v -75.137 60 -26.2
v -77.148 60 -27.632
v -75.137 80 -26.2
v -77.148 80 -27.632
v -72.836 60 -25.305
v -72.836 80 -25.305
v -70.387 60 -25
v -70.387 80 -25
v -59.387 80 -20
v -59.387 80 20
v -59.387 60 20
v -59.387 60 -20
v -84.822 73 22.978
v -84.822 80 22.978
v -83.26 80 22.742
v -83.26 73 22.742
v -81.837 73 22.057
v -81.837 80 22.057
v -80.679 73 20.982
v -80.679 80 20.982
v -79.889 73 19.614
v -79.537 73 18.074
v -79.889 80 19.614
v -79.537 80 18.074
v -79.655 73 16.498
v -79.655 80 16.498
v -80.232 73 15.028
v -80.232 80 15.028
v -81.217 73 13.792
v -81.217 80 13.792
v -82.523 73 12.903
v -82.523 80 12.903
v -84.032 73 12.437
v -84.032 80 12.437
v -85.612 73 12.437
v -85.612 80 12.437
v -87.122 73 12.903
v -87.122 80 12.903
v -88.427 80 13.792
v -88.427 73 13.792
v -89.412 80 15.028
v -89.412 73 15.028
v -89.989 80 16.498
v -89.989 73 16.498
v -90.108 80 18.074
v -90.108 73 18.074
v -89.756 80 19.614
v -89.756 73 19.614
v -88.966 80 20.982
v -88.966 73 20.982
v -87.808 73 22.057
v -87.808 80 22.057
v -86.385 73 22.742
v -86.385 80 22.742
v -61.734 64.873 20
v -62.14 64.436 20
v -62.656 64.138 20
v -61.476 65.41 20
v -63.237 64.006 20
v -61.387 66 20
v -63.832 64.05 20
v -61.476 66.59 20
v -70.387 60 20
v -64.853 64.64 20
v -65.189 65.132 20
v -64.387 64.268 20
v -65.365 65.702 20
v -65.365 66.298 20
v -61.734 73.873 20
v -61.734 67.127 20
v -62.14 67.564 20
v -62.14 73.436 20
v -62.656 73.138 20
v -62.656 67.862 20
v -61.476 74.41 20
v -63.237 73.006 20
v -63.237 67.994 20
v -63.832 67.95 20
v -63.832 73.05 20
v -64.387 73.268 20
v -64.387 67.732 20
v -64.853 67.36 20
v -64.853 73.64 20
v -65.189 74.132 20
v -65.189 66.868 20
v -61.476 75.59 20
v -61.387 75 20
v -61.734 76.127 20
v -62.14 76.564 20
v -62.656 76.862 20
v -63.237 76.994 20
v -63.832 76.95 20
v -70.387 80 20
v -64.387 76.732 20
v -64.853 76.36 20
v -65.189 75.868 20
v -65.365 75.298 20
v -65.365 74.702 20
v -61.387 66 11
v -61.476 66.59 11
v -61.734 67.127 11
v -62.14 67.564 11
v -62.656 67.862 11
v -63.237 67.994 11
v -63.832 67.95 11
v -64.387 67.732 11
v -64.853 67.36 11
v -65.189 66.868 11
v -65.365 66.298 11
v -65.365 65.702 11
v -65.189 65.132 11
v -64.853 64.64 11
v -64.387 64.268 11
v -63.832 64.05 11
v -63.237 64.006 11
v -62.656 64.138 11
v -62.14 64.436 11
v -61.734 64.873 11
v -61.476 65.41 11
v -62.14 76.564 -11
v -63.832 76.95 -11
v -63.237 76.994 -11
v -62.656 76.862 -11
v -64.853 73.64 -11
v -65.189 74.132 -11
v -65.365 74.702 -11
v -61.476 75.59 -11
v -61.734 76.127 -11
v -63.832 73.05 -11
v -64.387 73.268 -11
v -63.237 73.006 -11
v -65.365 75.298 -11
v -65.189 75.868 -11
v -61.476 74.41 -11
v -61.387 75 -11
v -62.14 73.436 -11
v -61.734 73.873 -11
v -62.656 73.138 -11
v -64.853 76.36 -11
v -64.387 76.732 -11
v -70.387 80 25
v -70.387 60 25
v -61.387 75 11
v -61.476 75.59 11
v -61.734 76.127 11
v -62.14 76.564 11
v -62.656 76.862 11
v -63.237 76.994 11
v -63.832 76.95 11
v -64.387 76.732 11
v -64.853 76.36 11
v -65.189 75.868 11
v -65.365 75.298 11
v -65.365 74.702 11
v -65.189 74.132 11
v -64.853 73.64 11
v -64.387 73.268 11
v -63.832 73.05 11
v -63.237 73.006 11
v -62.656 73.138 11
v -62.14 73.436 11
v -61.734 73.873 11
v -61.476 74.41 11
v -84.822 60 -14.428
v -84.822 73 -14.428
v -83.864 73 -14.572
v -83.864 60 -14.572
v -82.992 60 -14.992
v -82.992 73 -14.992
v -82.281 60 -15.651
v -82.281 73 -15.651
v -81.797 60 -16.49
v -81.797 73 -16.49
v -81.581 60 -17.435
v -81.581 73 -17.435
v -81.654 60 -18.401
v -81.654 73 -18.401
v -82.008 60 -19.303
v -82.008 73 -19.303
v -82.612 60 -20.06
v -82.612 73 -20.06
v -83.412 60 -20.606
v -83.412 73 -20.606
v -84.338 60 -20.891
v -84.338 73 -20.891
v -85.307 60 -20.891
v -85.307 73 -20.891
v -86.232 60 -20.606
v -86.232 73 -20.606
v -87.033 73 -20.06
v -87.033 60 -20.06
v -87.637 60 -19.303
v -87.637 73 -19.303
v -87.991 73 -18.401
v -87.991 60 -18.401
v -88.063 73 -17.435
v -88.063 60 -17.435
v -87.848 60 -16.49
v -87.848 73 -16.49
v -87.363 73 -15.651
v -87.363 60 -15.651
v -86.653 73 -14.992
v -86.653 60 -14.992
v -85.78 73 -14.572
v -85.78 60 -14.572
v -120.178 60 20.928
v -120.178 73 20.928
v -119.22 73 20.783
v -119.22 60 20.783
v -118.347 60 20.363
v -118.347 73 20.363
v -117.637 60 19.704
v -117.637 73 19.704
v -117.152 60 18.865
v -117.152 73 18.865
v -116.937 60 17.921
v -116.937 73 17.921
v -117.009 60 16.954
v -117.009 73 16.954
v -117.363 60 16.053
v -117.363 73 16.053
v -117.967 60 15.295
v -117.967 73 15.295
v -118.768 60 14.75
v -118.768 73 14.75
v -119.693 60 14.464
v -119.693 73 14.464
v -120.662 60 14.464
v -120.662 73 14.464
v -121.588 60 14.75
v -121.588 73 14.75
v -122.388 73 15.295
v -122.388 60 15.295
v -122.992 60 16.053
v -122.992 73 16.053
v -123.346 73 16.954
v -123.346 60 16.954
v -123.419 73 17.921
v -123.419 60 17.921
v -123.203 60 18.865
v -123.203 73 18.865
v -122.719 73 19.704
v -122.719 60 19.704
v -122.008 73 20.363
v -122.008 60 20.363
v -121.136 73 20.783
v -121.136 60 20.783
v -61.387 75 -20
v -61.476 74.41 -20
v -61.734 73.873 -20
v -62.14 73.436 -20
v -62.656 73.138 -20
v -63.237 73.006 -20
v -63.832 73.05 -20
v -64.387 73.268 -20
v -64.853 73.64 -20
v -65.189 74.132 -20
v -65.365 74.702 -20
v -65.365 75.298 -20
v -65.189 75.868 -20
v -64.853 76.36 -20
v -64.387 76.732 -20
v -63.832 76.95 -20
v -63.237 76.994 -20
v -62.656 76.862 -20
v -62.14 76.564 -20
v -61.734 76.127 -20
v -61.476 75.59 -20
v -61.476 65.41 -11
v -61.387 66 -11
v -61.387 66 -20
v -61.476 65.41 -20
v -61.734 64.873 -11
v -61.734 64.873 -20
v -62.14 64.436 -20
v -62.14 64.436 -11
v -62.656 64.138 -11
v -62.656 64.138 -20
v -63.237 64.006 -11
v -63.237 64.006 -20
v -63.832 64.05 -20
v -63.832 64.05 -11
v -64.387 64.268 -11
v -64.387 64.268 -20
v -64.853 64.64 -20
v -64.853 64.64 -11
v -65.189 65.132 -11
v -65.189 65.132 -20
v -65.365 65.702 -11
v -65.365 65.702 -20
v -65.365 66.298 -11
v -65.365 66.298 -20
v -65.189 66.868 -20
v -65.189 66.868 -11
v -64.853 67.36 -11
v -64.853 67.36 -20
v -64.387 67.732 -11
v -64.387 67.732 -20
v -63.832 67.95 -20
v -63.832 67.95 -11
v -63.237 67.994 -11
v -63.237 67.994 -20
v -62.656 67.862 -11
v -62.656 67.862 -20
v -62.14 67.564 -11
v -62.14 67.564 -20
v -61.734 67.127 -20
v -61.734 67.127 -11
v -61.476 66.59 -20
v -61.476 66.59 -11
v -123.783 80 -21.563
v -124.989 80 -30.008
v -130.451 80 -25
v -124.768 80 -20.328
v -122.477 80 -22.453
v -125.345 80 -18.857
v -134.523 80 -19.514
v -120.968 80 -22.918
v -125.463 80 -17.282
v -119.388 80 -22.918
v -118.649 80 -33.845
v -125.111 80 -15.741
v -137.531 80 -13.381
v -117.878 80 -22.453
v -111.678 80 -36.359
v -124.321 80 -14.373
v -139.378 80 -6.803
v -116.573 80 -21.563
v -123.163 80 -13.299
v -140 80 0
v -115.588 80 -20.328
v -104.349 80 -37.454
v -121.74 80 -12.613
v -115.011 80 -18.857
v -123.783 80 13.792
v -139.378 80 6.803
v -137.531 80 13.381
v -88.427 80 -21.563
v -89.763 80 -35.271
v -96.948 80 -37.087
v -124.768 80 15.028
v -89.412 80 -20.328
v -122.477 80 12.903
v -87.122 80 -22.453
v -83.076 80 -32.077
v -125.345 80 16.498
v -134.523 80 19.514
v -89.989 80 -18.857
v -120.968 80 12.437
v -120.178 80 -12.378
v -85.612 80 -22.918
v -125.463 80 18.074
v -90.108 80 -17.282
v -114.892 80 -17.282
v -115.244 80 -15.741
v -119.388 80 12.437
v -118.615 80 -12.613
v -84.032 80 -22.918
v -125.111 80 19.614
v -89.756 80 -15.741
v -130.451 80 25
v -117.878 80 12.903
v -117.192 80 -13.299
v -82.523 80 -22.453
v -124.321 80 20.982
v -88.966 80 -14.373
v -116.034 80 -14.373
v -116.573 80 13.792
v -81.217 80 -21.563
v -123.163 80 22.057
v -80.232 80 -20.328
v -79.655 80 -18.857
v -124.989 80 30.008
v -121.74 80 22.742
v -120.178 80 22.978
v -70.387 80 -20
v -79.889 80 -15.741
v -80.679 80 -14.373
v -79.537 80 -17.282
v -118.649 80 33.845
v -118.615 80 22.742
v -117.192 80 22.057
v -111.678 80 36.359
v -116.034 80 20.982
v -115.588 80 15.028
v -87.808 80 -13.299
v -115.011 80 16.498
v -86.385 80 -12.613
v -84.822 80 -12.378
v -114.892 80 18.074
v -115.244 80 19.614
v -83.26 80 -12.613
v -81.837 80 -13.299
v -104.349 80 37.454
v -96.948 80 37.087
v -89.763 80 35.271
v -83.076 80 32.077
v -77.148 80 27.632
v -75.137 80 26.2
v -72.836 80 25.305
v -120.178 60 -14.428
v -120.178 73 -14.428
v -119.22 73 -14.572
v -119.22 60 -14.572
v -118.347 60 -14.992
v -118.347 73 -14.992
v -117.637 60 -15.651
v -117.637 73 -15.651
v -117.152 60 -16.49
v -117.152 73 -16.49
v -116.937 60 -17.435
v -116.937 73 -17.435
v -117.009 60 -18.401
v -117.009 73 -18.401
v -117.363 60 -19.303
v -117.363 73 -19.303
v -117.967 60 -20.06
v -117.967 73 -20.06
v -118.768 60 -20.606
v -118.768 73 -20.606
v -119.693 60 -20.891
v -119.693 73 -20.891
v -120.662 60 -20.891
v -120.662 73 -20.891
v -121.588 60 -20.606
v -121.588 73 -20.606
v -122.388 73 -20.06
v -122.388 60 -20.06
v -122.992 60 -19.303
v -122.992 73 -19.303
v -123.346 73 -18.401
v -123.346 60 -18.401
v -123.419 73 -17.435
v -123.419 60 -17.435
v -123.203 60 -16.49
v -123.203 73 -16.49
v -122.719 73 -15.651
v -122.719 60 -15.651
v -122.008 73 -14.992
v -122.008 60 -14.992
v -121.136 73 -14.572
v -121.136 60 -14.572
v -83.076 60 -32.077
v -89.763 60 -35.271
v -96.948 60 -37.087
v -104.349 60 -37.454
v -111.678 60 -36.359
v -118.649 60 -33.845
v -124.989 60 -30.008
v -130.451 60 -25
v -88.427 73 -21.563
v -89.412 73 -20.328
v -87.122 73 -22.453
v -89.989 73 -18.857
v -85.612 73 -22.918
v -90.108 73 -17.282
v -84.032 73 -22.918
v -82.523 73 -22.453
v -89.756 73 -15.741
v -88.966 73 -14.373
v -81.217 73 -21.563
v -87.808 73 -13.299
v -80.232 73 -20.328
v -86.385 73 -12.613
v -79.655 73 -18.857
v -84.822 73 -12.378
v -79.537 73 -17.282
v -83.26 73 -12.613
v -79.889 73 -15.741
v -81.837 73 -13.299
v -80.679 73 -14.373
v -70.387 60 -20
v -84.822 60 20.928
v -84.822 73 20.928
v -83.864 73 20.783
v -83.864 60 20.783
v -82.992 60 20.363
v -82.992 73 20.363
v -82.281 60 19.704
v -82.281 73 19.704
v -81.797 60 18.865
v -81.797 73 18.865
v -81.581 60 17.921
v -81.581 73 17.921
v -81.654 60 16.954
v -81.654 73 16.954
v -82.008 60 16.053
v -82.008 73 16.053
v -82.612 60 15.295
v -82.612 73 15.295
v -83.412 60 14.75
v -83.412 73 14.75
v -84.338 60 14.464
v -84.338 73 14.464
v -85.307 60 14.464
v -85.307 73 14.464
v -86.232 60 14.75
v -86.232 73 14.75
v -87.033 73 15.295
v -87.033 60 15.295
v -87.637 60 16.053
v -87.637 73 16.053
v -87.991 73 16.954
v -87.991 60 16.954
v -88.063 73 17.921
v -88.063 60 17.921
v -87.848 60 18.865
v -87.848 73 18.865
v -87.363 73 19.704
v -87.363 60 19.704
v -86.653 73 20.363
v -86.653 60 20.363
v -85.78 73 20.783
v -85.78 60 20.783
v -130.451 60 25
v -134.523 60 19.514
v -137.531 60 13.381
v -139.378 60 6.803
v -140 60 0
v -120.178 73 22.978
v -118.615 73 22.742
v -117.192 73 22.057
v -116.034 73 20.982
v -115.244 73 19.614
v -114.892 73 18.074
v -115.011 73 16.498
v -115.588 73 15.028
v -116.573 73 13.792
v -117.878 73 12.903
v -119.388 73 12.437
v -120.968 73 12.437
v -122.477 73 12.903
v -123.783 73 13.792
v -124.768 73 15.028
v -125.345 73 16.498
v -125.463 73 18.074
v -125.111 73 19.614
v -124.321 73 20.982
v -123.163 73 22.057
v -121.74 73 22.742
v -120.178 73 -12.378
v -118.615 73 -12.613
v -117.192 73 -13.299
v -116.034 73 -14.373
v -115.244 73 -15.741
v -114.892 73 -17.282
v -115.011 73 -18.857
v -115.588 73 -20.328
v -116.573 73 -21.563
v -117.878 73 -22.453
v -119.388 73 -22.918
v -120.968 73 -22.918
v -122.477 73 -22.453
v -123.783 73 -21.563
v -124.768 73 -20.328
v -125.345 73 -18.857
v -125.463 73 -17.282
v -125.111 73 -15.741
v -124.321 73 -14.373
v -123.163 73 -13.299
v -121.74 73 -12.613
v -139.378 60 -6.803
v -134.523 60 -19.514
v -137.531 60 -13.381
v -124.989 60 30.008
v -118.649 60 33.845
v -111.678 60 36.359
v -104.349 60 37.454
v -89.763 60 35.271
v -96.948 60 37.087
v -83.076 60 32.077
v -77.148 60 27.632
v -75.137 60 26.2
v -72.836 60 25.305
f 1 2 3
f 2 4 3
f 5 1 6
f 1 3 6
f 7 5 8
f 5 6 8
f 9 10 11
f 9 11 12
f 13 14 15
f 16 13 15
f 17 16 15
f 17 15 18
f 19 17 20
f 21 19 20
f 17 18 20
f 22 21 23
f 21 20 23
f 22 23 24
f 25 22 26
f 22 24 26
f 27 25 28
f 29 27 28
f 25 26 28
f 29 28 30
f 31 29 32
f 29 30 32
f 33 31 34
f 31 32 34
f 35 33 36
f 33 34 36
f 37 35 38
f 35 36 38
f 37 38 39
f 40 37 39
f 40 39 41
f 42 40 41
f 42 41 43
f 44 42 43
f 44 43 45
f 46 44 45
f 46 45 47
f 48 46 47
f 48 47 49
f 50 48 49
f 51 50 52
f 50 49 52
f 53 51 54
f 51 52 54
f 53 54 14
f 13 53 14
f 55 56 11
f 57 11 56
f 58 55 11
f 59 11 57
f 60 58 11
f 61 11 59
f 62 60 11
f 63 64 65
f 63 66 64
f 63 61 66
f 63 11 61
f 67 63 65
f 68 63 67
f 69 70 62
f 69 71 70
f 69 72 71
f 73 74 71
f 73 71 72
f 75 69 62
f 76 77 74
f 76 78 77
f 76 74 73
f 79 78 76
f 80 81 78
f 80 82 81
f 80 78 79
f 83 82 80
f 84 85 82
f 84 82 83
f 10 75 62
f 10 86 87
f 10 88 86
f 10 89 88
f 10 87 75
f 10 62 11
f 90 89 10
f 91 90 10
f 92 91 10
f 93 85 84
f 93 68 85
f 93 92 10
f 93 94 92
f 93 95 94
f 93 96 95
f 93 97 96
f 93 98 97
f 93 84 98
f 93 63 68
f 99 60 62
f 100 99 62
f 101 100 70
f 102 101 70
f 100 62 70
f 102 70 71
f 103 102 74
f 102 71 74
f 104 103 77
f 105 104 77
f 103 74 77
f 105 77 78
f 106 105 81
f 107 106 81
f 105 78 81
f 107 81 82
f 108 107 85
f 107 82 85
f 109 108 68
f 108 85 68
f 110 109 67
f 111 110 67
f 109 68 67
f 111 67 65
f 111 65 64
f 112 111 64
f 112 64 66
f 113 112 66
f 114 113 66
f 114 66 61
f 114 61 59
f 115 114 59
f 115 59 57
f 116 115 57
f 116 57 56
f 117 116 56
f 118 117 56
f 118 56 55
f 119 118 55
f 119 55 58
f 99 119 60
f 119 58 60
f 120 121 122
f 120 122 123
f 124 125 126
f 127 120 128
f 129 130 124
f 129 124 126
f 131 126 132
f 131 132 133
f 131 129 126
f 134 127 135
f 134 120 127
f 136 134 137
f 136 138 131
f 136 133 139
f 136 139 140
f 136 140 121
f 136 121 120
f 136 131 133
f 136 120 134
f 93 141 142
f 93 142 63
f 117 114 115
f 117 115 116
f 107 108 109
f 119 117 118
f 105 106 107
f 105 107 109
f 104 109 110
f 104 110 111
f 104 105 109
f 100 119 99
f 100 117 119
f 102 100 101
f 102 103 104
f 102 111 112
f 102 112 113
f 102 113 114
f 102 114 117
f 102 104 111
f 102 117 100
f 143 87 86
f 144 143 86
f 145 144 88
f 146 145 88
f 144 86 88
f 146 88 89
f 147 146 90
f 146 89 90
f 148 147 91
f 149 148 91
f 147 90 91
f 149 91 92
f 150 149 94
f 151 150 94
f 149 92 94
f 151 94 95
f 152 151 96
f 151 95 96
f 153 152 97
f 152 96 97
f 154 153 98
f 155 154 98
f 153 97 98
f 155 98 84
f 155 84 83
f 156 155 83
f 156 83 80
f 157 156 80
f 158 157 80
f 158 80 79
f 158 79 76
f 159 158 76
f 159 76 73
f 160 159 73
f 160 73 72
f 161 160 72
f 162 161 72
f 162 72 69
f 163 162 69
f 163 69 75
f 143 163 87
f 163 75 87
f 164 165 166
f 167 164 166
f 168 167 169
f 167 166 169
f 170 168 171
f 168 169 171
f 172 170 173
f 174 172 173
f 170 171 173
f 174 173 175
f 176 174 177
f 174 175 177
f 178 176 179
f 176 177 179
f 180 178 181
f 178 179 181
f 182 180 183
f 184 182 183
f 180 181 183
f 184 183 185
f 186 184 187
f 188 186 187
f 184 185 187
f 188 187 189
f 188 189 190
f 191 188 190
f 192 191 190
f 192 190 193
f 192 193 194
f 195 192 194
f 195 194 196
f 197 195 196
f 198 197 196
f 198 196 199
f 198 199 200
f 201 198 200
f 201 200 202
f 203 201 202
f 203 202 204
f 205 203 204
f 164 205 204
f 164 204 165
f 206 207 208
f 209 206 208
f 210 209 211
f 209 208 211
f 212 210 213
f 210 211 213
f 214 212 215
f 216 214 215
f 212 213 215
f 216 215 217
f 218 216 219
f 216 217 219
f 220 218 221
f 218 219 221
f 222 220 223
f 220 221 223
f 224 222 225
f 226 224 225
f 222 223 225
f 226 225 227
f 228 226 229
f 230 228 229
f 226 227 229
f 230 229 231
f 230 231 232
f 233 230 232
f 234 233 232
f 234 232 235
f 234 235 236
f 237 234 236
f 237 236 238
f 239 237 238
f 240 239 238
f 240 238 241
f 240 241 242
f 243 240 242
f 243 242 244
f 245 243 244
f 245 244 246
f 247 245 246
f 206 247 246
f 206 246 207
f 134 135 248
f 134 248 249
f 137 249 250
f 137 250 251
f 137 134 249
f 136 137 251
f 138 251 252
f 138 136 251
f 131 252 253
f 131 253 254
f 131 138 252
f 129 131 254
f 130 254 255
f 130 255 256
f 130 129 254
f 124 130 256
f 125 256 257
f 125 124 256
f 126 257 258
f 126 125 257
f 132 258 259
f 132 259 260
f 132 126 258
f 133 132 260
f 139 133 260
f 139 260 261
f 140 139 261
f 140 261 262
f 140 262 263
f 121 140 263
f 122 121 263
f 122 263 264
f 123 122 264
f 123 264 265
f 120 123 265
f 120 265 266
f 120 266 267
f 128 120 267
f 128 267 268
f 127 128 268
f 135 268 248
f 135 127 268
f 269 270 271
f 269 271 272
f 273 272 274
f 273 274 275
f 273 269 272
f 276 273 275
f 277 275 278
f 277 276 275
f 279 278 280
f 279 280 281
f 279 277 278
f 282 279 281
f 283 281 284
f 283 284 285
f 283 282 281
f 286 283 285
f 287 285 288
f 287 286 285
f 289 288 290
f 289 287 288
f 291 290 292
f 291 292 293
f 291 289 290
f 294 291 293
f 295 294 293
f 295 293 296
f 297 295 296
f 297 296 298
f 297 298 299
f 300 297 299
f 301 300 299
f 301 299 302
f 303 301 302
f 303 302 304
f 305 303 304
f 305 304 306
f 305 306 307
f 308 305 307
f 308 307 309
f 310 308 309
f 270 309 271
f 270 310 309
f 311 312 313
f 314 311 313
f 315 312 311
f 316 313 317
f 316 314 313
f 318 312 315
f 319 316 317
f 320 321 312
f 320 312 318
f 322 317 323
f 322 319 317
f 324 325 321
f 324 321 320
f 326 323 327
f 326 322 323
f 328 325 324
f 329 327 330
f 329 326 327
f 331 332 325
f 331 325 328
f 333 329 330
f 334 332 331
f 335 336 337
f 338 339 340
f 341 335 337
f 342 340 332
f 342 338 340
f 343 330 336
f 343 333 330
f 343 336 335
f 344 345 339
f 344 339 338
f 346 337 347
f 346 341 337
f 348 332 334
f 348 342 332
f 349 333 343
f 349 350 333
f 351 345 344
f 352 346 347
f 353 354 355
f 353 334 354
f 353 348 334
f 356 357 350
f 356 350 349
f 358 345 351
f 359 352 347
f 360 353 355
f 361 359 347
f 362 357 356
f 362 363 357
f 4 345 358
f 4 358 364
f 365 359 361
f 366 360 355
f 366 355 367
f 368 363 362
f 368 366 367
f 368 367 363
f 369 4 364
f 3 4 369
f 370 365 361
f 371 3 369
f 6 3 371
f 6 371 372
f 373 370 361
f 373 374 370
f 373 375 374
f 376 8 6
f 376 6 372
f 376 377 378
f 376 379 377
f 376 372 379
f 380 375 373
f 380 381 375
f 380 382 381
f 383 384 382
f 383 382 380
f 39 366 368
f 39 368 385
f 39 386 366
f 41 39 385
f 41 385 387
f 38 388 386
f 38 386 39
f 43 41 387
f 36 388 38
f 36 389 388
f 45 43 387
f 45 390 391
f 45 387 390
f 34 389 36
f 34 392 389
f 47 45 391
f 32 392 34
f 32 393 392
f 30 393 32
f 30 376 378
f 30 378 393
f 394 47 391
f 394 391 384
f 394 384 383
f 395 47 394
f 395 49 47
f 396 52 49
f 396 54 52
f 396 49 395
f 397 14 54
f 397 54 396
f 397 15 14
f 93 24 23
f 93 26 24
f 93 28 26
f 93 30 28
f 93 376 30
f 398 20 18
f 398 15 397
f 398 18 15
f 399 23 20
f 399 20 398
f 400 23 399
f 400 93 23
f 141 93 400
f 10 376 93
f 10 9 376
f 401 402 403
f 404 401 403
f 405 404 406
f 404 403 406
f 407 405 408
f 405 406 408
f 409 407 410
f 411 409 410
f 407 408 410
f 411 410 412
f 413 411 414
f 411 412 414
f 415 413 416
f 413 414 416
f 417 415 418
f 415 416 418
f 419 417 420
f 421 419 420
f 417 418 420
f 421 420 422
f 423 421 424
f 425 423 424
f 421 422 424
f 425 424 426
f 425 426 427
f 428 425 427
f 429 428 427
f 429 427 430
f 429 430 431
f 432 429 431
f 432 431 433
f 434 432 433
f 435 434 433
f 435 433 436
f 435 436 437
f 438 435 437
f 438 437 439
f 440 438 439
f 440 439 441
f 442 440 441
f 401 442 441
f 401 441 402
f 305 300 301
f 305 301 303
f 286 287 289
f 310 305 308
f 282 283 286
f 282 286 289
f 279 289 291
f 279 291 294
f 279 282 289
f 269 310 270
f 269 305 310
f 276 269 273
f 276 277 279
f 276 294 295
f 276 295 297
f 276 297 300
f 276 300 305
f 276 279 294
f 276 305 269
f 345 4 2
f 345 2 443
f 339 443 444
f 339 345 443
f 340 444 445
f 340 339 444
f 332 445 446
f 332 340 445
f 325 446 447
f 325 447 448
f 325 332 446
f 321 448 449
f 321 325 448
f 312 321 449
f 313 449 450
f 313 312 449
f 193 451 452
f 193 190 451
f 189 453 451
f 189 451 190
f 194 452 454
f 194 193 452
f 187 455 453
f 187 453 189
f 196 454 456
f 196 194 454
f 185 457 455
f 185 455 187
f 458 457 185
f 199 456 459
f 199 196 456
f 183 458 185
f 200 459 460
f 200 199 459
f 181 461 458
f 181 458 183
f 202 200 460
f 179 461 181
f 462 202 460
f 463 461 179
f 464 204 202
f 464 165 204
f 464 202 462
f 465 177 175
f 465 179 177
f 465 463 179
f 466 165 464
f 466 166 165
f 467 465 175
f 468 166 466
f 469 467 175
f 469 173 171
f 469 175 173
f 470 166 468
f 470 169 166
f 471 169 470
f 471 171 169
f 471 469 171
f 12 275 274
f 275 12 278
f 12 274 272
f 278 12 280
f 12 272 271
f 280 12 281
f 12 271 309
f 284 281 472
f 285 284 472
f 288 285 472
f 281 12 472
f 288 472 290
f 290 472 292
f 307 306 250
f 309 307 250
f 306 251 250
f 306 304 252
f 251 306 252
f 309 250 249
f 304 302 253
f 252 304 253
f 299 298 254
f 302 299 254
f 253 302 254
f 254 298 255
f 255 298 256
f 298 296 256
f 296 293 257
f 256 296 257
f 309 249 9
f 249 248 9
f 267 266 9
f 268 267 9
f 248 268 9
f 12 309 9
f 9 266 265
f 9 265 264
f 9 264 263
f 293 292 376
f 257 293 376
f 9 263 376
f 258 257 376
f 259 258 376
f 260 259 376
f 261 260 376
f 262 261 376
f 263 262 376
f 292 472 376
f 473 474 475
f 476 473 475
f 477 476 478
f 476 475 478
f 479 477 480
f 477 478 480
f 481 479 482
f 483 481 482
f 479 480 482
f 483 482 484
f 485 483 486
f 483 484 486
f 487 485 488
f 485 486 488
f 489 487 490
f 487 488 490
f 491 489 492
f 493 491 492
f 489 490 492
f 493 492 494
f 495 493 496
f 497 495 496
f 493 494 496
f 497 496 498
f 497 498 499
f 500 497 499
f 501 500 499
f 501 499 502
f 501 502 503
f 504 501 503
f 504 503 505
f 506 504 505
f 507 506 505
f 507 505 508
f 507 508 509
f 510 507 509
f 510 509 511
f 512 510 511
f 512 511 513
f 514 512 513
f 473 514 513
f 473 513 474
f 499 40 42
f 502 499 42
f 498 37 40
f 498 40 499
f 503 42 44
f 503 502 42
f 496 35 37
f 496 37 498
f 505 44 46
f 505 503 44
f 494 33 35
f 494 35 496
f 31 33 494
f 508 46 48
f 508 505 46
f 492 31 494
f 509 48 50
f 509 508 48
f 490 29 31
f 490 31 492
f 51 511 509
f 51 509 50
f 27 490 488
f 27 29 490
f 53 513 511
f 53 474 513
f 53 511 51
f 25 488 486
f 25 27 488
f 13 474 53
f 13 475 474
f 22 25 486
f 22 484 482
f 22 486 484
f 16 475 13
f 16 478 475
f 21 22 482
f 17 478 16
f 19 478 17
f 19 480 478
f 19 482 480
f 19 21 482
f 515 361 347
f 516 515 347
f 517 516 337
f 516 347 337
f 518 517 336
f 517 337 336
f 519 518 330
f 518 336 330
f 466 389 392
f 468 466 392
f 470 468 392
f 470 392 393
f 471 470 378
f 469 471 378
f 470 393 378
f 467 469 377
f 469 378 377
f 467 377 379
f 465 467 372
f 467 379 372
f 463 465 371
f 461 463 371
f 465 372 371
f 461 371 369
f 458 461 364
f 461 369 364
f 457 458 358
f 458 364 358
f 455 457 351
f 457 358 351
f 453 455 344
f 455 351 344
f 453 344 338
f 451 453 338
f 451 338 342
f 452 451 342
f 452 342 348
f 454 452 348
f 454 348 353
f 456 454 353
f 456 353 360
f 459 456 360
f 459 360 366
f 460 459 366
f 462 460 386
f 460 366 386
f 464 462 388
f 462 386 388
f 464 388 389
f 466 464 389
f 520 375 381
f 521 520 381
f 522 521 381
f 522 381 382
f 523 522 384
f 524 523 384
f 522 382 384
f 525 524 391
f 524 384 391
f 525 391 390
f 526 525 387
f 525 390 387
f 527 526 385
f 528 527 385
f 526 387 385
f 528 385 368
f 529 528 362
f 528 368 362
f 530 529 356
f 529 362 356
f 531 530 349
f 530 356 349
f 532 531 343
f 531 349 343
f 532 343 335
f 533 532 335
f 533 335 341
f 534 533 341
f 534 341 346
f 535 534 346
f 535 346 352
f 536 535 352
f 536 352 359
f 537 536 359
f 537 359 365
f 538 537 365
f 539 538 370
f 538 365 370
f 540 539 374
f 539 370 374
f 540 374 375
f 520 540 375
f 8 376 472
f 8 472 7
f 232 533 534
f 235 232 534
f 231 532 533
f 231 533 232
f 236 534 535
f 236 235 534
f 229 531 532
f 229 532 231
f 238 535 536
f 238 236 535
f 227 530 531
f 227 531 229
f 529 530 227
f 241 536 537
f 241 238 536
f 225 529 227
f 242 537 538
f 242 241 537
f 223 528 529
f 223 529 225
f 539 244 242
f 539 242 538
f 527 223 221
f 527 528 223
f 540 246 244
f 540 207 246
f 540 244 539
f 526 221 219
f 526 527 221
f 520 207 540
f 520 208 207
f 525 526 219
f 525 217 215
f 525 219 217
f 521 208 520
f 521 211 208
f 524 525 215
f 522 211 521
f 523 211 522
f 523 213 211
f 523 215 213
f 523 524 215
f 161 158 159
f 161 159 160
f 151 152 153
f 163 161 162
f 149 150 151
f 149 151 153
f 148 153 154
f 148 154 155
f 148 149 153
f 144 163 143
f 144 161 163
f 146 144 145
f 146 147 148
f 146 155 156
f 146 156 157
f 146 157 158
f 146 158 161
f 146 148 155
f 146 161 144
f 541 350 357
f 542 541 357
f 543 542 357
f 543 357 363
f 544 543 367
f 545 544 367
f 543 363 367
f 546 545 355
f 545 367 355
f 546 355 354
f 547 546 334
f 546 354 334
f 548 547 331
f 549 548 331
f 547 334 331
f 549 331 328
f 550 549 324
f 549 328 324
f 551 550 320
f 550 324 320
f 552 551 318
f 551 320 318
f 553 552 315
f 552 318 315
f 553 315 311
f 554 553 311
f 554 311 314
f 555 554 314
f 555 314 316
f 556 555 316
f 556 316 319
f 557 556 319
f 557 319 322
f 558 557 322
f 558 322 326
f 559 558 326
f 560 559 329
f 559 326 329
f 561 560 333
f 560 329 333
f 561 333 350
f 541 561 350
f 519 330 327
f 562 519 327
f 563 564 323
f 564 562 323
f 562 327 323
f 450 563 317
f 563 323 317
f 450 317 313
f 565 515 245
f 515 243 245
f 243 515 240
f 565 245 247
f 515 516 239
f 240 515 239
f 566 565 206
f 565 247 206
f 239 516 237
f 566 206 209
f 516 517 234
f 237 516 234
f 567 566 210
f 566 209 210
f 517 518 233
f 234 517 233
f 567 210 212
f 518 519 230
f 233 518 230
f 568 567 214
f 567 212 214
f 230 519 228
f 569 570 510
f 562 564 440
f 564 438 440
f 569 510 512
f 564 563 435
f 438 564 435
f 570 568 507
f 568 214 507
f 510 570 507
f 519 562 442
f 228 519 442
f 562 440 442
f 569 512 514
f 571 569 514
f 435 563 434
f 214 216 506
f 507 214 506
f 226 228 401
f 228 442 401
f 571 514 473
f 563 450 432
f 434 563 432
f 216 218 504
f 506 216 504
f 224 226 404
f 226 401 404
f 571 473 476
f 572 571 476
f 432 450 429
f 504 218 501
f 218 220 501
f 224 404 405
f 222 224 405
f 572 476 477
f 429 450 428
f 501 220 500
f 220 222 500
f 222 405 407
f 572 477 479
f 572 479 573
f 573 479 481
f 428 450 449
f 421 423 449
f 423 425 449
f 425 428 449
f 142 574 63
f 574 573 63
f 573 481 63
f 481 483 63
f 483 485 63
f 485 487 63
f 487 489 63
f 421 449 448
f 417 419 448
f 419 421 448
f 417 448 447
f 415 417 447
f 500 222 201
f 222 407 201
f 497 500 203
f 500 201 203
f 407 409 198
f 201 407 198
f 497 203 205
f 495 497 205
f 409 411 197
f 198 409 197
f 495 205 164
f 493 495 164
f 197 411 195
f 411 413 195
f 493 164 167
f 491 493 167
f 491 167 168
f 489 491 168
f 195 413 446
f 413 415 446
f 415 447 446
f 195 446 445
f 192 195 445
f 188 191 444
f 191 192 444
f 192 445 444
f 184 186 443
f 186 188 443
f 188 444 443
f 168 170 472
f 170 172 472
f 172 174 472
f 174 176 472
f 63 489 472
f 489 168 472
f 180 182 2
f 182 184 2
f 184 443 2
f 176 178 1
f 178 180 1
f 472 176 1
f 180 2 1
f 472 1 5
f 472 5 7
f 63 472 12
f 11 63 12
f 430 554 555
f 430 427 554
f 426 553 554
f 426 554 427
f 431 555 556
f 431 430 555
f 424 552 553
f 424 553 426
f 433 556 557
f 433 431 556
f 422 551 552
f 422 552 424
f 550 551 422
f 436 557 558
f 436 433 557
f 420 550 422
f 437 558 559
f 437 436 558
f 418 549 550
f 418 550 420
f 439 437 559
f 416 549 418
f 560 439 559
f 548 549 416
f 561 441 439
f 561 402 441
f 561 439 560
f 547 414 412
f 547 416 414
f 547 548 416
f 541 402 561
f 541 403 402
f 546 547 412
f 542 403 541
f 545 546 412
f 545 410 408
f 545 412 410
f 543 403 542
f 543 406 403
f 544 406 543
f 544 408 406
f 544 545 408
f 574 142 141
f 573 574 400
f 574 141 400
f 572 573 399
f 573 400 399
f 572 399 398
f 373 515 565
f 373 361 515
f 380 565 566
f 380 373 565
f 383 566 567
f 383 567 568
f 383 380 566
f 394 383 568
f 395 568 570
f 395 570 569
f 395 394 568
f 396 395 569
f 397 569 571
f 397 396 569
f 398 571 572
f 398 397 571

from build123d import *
from build123d.topology import SkipClean

# Parameters (mm, degrees)
SKETCH1_W                = 50
SKETCH1_H                = 50
SKETCH1_RX               = 19.7
SKETCH1_RY               = 19.1
BOSS_EXTRUDE1_DEPTH      = 35
SKETCH2_W                = 30
SKETCH2_H                = 50
CUT_EXTRUDE1_DEPTH       = 35
SKETCH3_W                = 13
SKETCH3_H                = 50
BOSS_EXTRUDE2_DEPTH      = 20
SKETCH4_R                = 1.5
CUT_EXTRUDE2_DEPTH       = 64.639610377
SKETCH5_W                = 36.974567712
SKETCH5_H                = 20
CUT_EXTRUDE3_DEPTH       = 20
BOSS_EXTRUDE3_DEPTH      = 4
BOSS_EXTRUDE3_DEPTH_BACK = 20
SKETCH6_W                = 14
SKETCH6_H                = 20
SKETCH6_R                = 3.25
SKETCH7_R                = 5.3
SKETCH7_R_2              = 3
CUT_EXTRUDE4_DEPTH       = 6
SKETCH8_W                = 13
SKETCH8_H                = 13.025432288
CUT_EXTRUDE5_DEPTH       = 30
FILLET6_R                = 4
FILLET5_R                = 10
SKETCH9_R                = 5.3
BOSS_EXTRUDE4_DEPTH      = 30
SKETCH10_W               = 20
SKETCH10_H               = 50
BOSS_EXTRUDE5_DEPTH      = 45
FILLET7_R                = 10
SKETCH11_W               = 50
SKETCH11_H               = 20
BOSS_EXTRUDE6_DEPTH      = 85
FILLET8_R                = 9.5
SKETCH13_R               = 37.5
BOSS_EXTRUDE7_DEPTH      = 20
CUT_EXTRUDE6_DEPTH       = 85
FILLET9_R                = 10
FILLET10_R               = 10
SKETCH14_R               = 3.25
CUT_EXTRUDE7_DEPTH       = 85
SKETCH15_R               = 5.3
CUT_EXTRUDE8_DEPTH       = 7
SKETCH16_R               = 3.25
BOSS_EXTRUDE9_DEPTH      = 36
SKETCH16_3_R             = 3.25
CUT_EXTRUDE11_DEPTH      = 10
SKETCH18_W               = 78
SKETCH18_H               = 80
CUT_EXTRUDE13_DEPTH      = 69.386919
SKETCH19_W               = 40
SKETCH19_H               = 20
BOSS_EXTRUDE10_DEPTH     = 11
SKETCH20_R               = 2
CUT_EXTRUDE14_DEPTH      = 9
CUT_EXTRUDE15_START      = -9
SKETCH21_R               = 2
CUT_EXTRUDE15_DEPTH      = 9


# Some blends are built 0.0001 mm under size
with BuildPart() as part:
    # Sketch1 → Boss-Extrude1 (new body)
    with BuildSketch(Plane(origin=(0, 0, 0), x_dir=(1, 0, 0), z_dir=(0, 1, 0))):
        Rectangle(SKETCH1_W, SKETCH1_H)
        with Locations((0, 0)):
            Ellipse(SKETCH1_RX, SKETCH1_RY, mode=Mode.SUBTRACT)
    extrude(amount=BOSS_EXTRUDE1_DEPTH)

    # Sketch2 → Cut-Extrude1 (cut)
    with BuildSketch(Plane(origin=(0, 35, 0), x_dir=(1, 0, 0), z_dir=(0, 1, 0))):
        with Locations((10, 0)):
            Rectangle(SKETCH2_W, SKETCH2_H)
    extrude(amount=-CUT_EXTRUDE1_DEPTH, mode=Mode.SUBTRACT)

    # Sketch3 → Boss-Extrude2 (add)
    with BuildSketch(Plane(origin=(0, 35, 0), x_dir=(1, 0, 0), z_dir=(0, 1, 0))):
        with Locations((-18.5, 0)):
            Rectangle(SKETCH3_W, SKETCH3_H)
    extrude(amount=BOSS_EXTRUDE2_DEPTH)

    # Sketch4 → Cut-Extrude2 (cut, through all)
    with BuildSketch(Plane.ZY.offset(25)):
        with Locations((18.474567712, 50)):
            Circle(SKETCH4_R)
    extrude(amount=-CUT_EXTRUDE2_DEPTH, mode=Mode.SUBTRACT)

    # Sketch5 → Cut-Extrude3 (cut)
    with BuildSketch(Plane(origin=(-12, 55, -25), x_dir=(0, 0, 1), z_dir=(-1, 0, 0))):
        with Locations((18.487283856, -10)):
            Rectangle(SKETCH5_W, SKETCH5_H)
    extrude(amount=CUT_EXTRUDE3_DEPTH, mode=Mode.SUBTRACT)

    # Sketch6 → Boss-Extrude3 (add, two sides: drawn at the far end of the back side and taken through both)
    # profile 1 of 2: a face of its own
    with BuildSketch(Plane(origin=(-5, 0, 0), x_dir=(0, 0, -1), z_dir=(1, 0, 0)).offset(-BOSS_EXTRUDE3_DEPTH_BACK)):
        with Locations((-32, 17.5)):
            Rectangle(SKETCH6_W, SKETCH6_H)
        with Locations((-32, 17.5)):
            Circle(SKETCH6_R, mode=Mode.SUBTRACT)
    # profile 2 of 2: a face of its own
    with BuildSketch(Plane(origin=(-5, 0, 0), x_dir=(0, 0, -1), z_dir=(1, 0, 0)).offset(-BOSS_EXTRUDE3_DEPTH_BACK)):
        with Locations((32, 17.5)):
            Rectangle(SKETCH6_W, SKETCH6_H)
        with Locations((32, 17.5)):
            Circle(SKETCH6_R, mode=Mode.SUBTRACT)
    extrude(amount=BOSS_EXTRUDE3_DEPTH + BOSS_EXTRUDE3_DEPTH_BACK)

    # Sketch7 → Cut-Extrude4 (cut)
    with BuildSketch(Plane.ZY.offset(25)):
        with Locations((-32, 17.5)):
            Circle(SKETCH7_R)
        with Locations((32, 17.5)):
            Circle(SKETCH7_R)
        with Locations((18.474567712, 50)):
            Circle(SKETCH7_R_2)
    extrude(amount=-CUT_EXTRUDE4_DEPTH, mode=Mode.SUBTRACT)

    # Sketch8 → Cut-Extrude5 (cut)
    with BuildSketch(Plane(origin=(0, 35, 0), x_dir=(1, 0, 0), z_dir=(0, 1, 0))):
        with Locations((-18.5, -18.487283856)):
            Rectangle(SKETCH8_W, SKETCH8_H)
    extrude(amount=CUT_EXTRUDE5_DEPTH, mode=Mode.SUBTRACT)

    # Fillet6
    fillet6_edges = [part.edges().sort_by_distance(p)[0] for p in [
        (-5, 17.5, 25),
        (-5, 17.5, -25),
    ]]
    fillet(fillet6_edges, radius=FILLET6_R - 0.0001)  # a hair under: the kernel refuses the full size

    # Fillet5
    # the kernel refuses this fillet: 10 mm, written as the material it adds along each edge
    with BuildSketch(Plane(origin=(-5, 7.5, 25), x_dir=(0, -1, 0), z_dir=(-1, 0, 0))) as fillet5_piece_1:
        with BuildLine():
            CenterArc((10, 9.682458366), FILLET5_R, 180, 75.522487814)
            Line((0, 9.682458366), (0, 0))
            Line((0, 0), (7.5, 0))
        make_face()
    extrude(amount=20)
    with BuildSketch(Plane(origin=(-5, 27.5, 25), x_dir=(0, 0, 1), z_dir=(-1, 0, 0)), Plane(origin=(-5, 7.5, -25), x_dir=(0, 0, -1), z_dir=(-1, 0, 0))) as fillet5_piece_2:
        with BuildLine():
            CenterArc((9.682458366, 10), FILLET5_R, 194.477512186, 75.522487814)
            Line((0, 7.5), (0, 0))
            Line((0, 0), (9.682458366, 0))
        make_face()
    extrude(amount=20)
    with BuildSketch(Plane(origin=(-5, 27.5, -25), x_dir=(0, 0, -1), z_dir=(-1, 0, 0))) as fillet5_piece_3:
        with BuildLine():
            CenterArc((9.682458366, -10), FILLET5_R, 90, 75.522487814)
            Line((0, -7.5), (0, 0))
            Line((0, 0), (9.682458366, 0))
        make_face()
    extrude(amount=20)

    # Sketch9 → Boss-Extrude4 (add)
    with BuildSketch(Plane.ZY.offset(25)):
        with BuildLine():
            Line((39, 27.5), (34.682458366, 27.5))
            ThreePointArc((34.682458366, 27.5), (28.558734009, 29.59430585), (25, 35))
            Line((25, 35), (-25, 35))
            ThreePointArc((-25, 35), (-28.558734009, 29.59430585), (-34.682458366, 27.5))
            Line((-34.682458366, 27.5), (-39, 27.5))
            Line((-39, 27.5), (-39, 7.5))
            Line((-39, 7.5), (-34.682458366, 7.5))
            ThreePointArc((-34.682458366, 7.5), (-28.558734009, 5.40569415), (-25, 0))
            Line((-25, 0), (25, 0))
            ThreePointArc((25, 0), (28.558734009, 5.40569415), (34.682458366, 7.5))
            Line((34.682458366, 7.5), (39, 7.5))
            Line((39, 7.5), (39, 27.5))
        make_face()
        with Locations((32, 17.5)):
            Circle(SKETCH9_R, mode=Mode.SUBTRACT)
        with Locations((-32, 17.5)):
            Circle(SKETCH9_R, mode=Mode.SUBTRACT)
    extrude(amount=BOSS_EXTRUDE4_DEPTH)

    # Sketch10 → Boss-Extrude5 (add)
    with SkipClean():  # the faces are left unmerged after this step: merging them gives an invalid solid
        with BuildSketch(Plane(origin=(0, 35, 0), x_dir=(1, 0, 0), z_dir=(0, 1, 0))):
            with Locations((-45, 0)):
                Rectangle(SKETCH10_W, SKETCH10_H)
        extrude(amount=BOSS_EXTRUDE5_DEPTH)

    # Fillet7
    fillet7_edges = [part.edges().sort_by_distance(p)[0] for p in [
        (-35, 35, 0),
    ]]
    fillet(fillet7_edges, radius=FILLET7_R - 0.0001)  # a hair under: the kernel refuses the full size

    # Sketch11 → Boss-Extrude6 (add)
    with BuildSketch(Plane.ZY.offset(55)):
        with Locations((0, 70)):
            Rectangle(SKETCH11_W, SKETCH11_H)
    extrude(amount=BOSS_EXTRUDE6_DEPTH)

    # Fillet8
    fillet8_edges = [part.edges().sort_by_distance(p)[0] for p in [
        (-55, 60, 0),
    ]]
    fillet(fillet8_edges, radius=FILLET8_R)

    # Sketch13 → Boss-Extrude7 (add)
    with BuildSketch(Plane(origin=(0, 80, 0), x_dir=(1, 0, 0), z_dir=(0, 1, 0))):
        with Locations((-102.5, 0)):
            Circle(SKETCH13_R)
    extrude(amount=-BOSS_EXTRUDE7_DEPTH)

    # Sketch13<3> → Cut-Extrude6 (cut)
    with BuildSketch(Plane(origin=(0, 80, 0), x_dir=(1, 0, 0), z_dir=(0, 1, 0))):
        with BuildLine():
            Line((-124.371968295, 30.460909424), (-140, 25))
            Line((-140, 25), (-140, 0))
            ThreePointArc((-140, 0), (-135.865017691, 17.117990375), (-124.371968295, 30.460909424))
        make_face()
        with BuildLine():
            ThreePointArc((-130.450849719, -25), (-137.531463461, -13.380828366), (-140, 0))
            Line((-140, 0), (-140, -25))
            Line((-140, -25), (-130.450849719, -25))
        make_face()
    extrude(amount=-CUT_EXTRUDE6_DEPTH, mode=Mode.SUBTRACT)

    # Fillet9
    fillet9_edges = [part.edges().sort_by_distance(p)[0] for p in [
        (-74.549150281, 70, 25),
        (-74.549150281, 70, -25),
    ]]
    fillet(fillet9_edges, radius=FILLET9_R)

    # Fillet10
    fillet10_edges = [part.edges().sort_by_distance(p)[0] for p in [
        (-35, 80, 0),
    ]]
    fillet(fillet10_edges, radius=FILLET10_R)

    # Sketch14 → Cut-Extrude7 (cut)
    with BuildSketch(Plane(origin=(0, 80, 0), x_dir=(1, 0, 0), z_dir=(0, 1, 0))):
        with Locations(Location((-120.17766953, 17.67766953, 0), (0, 0, 270))):
            Circle(SKETCH14_R)
        with Locations(Location((-120.17766953, -17.67766953, 0), (0, 0, 270))):
            Circle(SKETCH14_R)
        with Locations(Location((-84.82233047, -17.67766953, 0), (0, 0, 270))):
            Circle(SKETCH14_R)
        with Locations(Location((-84.82233047, 17.67766953, 0), (0, 0, 270))):
            Circle(SKETCH14_R)
    extrude(amount=-CUT_EXTRUDE7_DEPTH, mode=Mode.SUBTRACT)

    # Sketch15 → Cut-Extrude8 (cut)
    with BuildSketch(Plane(origin=(0, 80, 0), x_dir=(1, 0, 0), z_dir=(0, 1, 0))):
        with Locations(Location((-120.17766953, 17.67766953, 0), (0, 0, 270))):
            Circle(SKETCH15_R)
        with Locations(Location((-120.17766953, -17.67766953, 0), (0, 0, 270))):
            Circle(SKETCH15_R)
        with Locations(Location((-84.82233047, -17.67766953, 0), (0, 0, 270))):
            Circle(SKETCH15_R)
        with Locations(Location((-84.82233047, 17.67766953, 0), (0, 0, 270))):
            Circle(SKETCH15_R)
    extrude(amount=-CUT_EXTRUDE8_DEPTH, mode=Mode.SUBTRACT)

    # Sketch16 → Boss-Extrude9 (add)
    # profile 1 of 2: a face of its own
    with BuildSketch(Plane.ZY.offset(55)):
        Polygon((-25.937822174, 17.5), (-28.968911087, 22.75), (-35.031088913, 22.75), (-38.062177826, 17.5), (-35.031088913, 12.25), (-28.968911087, 12.25), align=None)
        with Locations(Location((-32, 17.5, 0), (0, 0, 180))):
            Circle(SKETCH16_R, mode=Mode.SUBTRACT)
    # profile 2 of 2: a face of its own
    with BuildSketch(Plane.ZY.offset(55)):
        Polygon((25.937822174, 17.5), (28.968911087, 12.25), (35.031088913, 12.25), (38.062177826, 17.5), (35.031088913, 22.75), (28.968911087, 22.75), align=None)
        with Locations(Location((32, 17.5, 0), (0, 0, 180))):
            Circle(SKETCH16_R, mode=Mode.SUBTRACT)
    extrude(amount=-BOSS_EXTRUDE9_DEPTH)

    # Sketch16<3> → Cut-Extrude11 (cut)
    # profile 1 of 2: a face of its own
    with BuildSketch(Plane.ZY.offset(55)):
        Polygon((-25.937822174, 17.5), (-28.968911087, 22.75), (-35.031088913, 22.75), (-38.062177826, 17.5), (-35.031088913, 12.25), (-28.968911087, 12.25), align=None)
        with Locations(Location((-32, 17.5, 0), (0, 0, 180))):
            Circle(SKETCH16_3_R, mode=Mode.SUBTRACT)
    # profile 2 of 2: a face of its own
    with BuildSketch(Plane.ZY.offset(55)):
        Polygon((25.937822174, 17.5), (28.968911087, 12.25), (35.031088913, 12.25), (38.062177826, 17.5), (35.031088913, 22.75), (28.968911087, 22.75), align=None)
        with Locations(Location((32, 17.5, 0), (0, 0, 180))):
            Circle(SKETCH16_3_R, mode=Mode.SUBTRACT)
    extrude(amount=-CUT_EXTRUDE11_DEPTH, mode=Mode.SUBTRACT)

    # Sketch18 → Cut-Extrude13 (cut)
    with BuildSketch(Plane(origin=(-1, 0, 0), x_dir=(0, 0, -1), z_dir=(1, 0, 0))):
        with Locations((0, 40)):
            Rectangle(SKETCH18_W, SKETCH18_H)
    extrude(amount=-CUT_EXTRUDE13_DEPTH, mode=Mode.SUBTRACT)


with BuildPart() as boss_extrude10_tool:
    # Sketch19 → Boss-Extrude10 (new body)
    with BuildSketch(Plane(origin=(-70.386918553, 0, 0), x_dir=(0, 0, -1), z_dir=(1, 0, 0))):
        with Locations((0, 70)):
            Rectangle(SKETCH19_W, SKETCH19_H)
    extrude(amount=BOSS_EXTRUDE10_DEPTH)


with BuildPart() as part_1:
    add(part.part)


with BuildPart() as part_2:
    # Boss-Extrude10: joined with boss_extrude10_tool
    add(part_1.part.fuse(boss_extrude10_tool.part, tol=0.00001))

    # Sketch20 → Cut-Extrude14 (cut)
    with BuildSketch(Plane.XY.offset(20)):
        with Locations((-63.386918553, 75)):
            Circle(SKETCH20_R)
        with Locations((-63.386918553, 66)):
            Circle(SKETCH20_R)
    extrude(amount=-CUT_EXTRUDE14_DEPTH, mode=Mode.SUBTRACT)

    # Sketch21 → Cut-Extrude15 (cut)
    with BuildSketch(Plane(origin=(0, 0, -20), x_dir=(-1, 0, 0), z_dir=(0, 0, -1)).offset(CUT_EXTRUDE15_START)):
        with Locations(Location((63.386918553, 75, 0), (0, 0, 180))):
            Circle(SKETCH21_R)
        with Locations(Location((63.386918553, 66, 0), (0, 0, 180))):
            Circle(SKETCH21_R)
    extrude(amount=CUT_EXTRUDE15_DEPTH, mode=Mode.SUBTRACT)


solid = part_2.part
